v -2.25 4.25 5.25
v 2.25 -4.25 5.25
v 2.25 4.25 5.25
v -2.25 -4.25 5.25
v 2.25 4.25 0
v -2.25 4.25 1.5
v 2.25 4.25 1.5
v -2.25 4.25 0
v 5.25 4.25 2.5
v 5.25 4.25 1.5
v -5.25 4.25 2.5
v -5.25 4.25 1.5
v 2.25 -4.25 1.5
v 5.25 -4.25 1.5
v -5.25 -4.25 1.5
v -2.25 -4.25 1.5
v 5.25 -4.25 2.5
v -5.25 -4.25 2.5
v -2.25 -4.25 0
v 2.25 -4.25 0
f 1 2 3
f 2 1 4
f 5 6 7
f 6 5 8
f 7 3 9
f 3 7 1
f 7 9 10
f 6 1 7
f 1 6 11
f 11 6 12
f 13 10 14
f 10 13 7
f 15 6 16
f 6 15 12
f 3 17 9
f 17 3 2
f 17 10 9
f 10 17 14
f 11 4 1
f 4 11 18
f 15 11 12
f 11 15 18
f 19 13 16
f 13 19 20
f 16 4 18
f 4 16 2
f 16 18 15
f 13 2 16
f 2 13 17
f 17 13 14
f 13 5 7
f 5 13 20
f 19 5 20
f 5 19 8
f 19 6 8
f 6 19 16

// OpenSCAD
/*
  PrinterLightBracket.scad

  A bracket to mount a light bar on top of the Ender 3
  printer. Adapts the 2020 extrusion to metal clips
  that hold the light.
*/

$fn=75;

/* Measured dimensions of extrusion */
EXT_WIDTH=20;
EXT_SLOT=6.2;
EXT_DEPTH=4.3;
EXT_THICK=1.5;

/* Measured dimensions of light clip */
CLIP_LEN=25.6;
CLIP_WIDTH=14.7;
CLIP_THICKNESS=9;
CLIP_MAX_WIDTH=23;
CLIP_HOLE_DIA=3.75;
CLIP_TOP_OFFSET=((CLIP_LEN/2)-5.8-(CLIP_HOLE_DIA/2));



/* Model of the light clip */
module clip_hull() {
    hull() {
        translate([0,0,CLIP_THICKNESS-0.5]) cube([CLIP_LEN, CLIP_WIDTH, 1], center=true);
        translate([0,0,0.5]) cube([CLIP_LEN, CLIP_MAX_WIDTH, 1], center=true);
    }
}

module clip() {
    difference() {
        clip_hull();
        scale([1,0.95,0.93]) clip_hull();
        translate([CLIP_TOP_OFFSET,0,0]) cylinder(h=CLIP_THICKNESS+1, d=CLIP_HOLE_DIA);
        translate([0,0,2]) rotate([60,0,0]) cylinder(h=CLIP_THICKNESS+10, d=CLIP_HOLE_DIA);
    }
}

/* Model of 2020 extrusion */
module extrusion() {
}

module t_slot() {
    translate([0,0,2]) hull() {
        cube([10.5,8.5,1], center=true);
        translate([0,0,2.75]) cube([4.5,8.5,1], center=true);
    }
    translate([0,0,1]) cube([4.5,8.5,2], center=true);
}

// clip();
// linear_extrude(height=20, twist=90, slices=100)
/*
difference() {
    offset(delta=10,chamfer=true) square([10,10], center=true);
    offset(r=8) square([10,10], center=true);
}
difference() {
    square([10,10], center=true);
    offset(r=-1) square([10,10], center=true);
}
*/

t_slot();
